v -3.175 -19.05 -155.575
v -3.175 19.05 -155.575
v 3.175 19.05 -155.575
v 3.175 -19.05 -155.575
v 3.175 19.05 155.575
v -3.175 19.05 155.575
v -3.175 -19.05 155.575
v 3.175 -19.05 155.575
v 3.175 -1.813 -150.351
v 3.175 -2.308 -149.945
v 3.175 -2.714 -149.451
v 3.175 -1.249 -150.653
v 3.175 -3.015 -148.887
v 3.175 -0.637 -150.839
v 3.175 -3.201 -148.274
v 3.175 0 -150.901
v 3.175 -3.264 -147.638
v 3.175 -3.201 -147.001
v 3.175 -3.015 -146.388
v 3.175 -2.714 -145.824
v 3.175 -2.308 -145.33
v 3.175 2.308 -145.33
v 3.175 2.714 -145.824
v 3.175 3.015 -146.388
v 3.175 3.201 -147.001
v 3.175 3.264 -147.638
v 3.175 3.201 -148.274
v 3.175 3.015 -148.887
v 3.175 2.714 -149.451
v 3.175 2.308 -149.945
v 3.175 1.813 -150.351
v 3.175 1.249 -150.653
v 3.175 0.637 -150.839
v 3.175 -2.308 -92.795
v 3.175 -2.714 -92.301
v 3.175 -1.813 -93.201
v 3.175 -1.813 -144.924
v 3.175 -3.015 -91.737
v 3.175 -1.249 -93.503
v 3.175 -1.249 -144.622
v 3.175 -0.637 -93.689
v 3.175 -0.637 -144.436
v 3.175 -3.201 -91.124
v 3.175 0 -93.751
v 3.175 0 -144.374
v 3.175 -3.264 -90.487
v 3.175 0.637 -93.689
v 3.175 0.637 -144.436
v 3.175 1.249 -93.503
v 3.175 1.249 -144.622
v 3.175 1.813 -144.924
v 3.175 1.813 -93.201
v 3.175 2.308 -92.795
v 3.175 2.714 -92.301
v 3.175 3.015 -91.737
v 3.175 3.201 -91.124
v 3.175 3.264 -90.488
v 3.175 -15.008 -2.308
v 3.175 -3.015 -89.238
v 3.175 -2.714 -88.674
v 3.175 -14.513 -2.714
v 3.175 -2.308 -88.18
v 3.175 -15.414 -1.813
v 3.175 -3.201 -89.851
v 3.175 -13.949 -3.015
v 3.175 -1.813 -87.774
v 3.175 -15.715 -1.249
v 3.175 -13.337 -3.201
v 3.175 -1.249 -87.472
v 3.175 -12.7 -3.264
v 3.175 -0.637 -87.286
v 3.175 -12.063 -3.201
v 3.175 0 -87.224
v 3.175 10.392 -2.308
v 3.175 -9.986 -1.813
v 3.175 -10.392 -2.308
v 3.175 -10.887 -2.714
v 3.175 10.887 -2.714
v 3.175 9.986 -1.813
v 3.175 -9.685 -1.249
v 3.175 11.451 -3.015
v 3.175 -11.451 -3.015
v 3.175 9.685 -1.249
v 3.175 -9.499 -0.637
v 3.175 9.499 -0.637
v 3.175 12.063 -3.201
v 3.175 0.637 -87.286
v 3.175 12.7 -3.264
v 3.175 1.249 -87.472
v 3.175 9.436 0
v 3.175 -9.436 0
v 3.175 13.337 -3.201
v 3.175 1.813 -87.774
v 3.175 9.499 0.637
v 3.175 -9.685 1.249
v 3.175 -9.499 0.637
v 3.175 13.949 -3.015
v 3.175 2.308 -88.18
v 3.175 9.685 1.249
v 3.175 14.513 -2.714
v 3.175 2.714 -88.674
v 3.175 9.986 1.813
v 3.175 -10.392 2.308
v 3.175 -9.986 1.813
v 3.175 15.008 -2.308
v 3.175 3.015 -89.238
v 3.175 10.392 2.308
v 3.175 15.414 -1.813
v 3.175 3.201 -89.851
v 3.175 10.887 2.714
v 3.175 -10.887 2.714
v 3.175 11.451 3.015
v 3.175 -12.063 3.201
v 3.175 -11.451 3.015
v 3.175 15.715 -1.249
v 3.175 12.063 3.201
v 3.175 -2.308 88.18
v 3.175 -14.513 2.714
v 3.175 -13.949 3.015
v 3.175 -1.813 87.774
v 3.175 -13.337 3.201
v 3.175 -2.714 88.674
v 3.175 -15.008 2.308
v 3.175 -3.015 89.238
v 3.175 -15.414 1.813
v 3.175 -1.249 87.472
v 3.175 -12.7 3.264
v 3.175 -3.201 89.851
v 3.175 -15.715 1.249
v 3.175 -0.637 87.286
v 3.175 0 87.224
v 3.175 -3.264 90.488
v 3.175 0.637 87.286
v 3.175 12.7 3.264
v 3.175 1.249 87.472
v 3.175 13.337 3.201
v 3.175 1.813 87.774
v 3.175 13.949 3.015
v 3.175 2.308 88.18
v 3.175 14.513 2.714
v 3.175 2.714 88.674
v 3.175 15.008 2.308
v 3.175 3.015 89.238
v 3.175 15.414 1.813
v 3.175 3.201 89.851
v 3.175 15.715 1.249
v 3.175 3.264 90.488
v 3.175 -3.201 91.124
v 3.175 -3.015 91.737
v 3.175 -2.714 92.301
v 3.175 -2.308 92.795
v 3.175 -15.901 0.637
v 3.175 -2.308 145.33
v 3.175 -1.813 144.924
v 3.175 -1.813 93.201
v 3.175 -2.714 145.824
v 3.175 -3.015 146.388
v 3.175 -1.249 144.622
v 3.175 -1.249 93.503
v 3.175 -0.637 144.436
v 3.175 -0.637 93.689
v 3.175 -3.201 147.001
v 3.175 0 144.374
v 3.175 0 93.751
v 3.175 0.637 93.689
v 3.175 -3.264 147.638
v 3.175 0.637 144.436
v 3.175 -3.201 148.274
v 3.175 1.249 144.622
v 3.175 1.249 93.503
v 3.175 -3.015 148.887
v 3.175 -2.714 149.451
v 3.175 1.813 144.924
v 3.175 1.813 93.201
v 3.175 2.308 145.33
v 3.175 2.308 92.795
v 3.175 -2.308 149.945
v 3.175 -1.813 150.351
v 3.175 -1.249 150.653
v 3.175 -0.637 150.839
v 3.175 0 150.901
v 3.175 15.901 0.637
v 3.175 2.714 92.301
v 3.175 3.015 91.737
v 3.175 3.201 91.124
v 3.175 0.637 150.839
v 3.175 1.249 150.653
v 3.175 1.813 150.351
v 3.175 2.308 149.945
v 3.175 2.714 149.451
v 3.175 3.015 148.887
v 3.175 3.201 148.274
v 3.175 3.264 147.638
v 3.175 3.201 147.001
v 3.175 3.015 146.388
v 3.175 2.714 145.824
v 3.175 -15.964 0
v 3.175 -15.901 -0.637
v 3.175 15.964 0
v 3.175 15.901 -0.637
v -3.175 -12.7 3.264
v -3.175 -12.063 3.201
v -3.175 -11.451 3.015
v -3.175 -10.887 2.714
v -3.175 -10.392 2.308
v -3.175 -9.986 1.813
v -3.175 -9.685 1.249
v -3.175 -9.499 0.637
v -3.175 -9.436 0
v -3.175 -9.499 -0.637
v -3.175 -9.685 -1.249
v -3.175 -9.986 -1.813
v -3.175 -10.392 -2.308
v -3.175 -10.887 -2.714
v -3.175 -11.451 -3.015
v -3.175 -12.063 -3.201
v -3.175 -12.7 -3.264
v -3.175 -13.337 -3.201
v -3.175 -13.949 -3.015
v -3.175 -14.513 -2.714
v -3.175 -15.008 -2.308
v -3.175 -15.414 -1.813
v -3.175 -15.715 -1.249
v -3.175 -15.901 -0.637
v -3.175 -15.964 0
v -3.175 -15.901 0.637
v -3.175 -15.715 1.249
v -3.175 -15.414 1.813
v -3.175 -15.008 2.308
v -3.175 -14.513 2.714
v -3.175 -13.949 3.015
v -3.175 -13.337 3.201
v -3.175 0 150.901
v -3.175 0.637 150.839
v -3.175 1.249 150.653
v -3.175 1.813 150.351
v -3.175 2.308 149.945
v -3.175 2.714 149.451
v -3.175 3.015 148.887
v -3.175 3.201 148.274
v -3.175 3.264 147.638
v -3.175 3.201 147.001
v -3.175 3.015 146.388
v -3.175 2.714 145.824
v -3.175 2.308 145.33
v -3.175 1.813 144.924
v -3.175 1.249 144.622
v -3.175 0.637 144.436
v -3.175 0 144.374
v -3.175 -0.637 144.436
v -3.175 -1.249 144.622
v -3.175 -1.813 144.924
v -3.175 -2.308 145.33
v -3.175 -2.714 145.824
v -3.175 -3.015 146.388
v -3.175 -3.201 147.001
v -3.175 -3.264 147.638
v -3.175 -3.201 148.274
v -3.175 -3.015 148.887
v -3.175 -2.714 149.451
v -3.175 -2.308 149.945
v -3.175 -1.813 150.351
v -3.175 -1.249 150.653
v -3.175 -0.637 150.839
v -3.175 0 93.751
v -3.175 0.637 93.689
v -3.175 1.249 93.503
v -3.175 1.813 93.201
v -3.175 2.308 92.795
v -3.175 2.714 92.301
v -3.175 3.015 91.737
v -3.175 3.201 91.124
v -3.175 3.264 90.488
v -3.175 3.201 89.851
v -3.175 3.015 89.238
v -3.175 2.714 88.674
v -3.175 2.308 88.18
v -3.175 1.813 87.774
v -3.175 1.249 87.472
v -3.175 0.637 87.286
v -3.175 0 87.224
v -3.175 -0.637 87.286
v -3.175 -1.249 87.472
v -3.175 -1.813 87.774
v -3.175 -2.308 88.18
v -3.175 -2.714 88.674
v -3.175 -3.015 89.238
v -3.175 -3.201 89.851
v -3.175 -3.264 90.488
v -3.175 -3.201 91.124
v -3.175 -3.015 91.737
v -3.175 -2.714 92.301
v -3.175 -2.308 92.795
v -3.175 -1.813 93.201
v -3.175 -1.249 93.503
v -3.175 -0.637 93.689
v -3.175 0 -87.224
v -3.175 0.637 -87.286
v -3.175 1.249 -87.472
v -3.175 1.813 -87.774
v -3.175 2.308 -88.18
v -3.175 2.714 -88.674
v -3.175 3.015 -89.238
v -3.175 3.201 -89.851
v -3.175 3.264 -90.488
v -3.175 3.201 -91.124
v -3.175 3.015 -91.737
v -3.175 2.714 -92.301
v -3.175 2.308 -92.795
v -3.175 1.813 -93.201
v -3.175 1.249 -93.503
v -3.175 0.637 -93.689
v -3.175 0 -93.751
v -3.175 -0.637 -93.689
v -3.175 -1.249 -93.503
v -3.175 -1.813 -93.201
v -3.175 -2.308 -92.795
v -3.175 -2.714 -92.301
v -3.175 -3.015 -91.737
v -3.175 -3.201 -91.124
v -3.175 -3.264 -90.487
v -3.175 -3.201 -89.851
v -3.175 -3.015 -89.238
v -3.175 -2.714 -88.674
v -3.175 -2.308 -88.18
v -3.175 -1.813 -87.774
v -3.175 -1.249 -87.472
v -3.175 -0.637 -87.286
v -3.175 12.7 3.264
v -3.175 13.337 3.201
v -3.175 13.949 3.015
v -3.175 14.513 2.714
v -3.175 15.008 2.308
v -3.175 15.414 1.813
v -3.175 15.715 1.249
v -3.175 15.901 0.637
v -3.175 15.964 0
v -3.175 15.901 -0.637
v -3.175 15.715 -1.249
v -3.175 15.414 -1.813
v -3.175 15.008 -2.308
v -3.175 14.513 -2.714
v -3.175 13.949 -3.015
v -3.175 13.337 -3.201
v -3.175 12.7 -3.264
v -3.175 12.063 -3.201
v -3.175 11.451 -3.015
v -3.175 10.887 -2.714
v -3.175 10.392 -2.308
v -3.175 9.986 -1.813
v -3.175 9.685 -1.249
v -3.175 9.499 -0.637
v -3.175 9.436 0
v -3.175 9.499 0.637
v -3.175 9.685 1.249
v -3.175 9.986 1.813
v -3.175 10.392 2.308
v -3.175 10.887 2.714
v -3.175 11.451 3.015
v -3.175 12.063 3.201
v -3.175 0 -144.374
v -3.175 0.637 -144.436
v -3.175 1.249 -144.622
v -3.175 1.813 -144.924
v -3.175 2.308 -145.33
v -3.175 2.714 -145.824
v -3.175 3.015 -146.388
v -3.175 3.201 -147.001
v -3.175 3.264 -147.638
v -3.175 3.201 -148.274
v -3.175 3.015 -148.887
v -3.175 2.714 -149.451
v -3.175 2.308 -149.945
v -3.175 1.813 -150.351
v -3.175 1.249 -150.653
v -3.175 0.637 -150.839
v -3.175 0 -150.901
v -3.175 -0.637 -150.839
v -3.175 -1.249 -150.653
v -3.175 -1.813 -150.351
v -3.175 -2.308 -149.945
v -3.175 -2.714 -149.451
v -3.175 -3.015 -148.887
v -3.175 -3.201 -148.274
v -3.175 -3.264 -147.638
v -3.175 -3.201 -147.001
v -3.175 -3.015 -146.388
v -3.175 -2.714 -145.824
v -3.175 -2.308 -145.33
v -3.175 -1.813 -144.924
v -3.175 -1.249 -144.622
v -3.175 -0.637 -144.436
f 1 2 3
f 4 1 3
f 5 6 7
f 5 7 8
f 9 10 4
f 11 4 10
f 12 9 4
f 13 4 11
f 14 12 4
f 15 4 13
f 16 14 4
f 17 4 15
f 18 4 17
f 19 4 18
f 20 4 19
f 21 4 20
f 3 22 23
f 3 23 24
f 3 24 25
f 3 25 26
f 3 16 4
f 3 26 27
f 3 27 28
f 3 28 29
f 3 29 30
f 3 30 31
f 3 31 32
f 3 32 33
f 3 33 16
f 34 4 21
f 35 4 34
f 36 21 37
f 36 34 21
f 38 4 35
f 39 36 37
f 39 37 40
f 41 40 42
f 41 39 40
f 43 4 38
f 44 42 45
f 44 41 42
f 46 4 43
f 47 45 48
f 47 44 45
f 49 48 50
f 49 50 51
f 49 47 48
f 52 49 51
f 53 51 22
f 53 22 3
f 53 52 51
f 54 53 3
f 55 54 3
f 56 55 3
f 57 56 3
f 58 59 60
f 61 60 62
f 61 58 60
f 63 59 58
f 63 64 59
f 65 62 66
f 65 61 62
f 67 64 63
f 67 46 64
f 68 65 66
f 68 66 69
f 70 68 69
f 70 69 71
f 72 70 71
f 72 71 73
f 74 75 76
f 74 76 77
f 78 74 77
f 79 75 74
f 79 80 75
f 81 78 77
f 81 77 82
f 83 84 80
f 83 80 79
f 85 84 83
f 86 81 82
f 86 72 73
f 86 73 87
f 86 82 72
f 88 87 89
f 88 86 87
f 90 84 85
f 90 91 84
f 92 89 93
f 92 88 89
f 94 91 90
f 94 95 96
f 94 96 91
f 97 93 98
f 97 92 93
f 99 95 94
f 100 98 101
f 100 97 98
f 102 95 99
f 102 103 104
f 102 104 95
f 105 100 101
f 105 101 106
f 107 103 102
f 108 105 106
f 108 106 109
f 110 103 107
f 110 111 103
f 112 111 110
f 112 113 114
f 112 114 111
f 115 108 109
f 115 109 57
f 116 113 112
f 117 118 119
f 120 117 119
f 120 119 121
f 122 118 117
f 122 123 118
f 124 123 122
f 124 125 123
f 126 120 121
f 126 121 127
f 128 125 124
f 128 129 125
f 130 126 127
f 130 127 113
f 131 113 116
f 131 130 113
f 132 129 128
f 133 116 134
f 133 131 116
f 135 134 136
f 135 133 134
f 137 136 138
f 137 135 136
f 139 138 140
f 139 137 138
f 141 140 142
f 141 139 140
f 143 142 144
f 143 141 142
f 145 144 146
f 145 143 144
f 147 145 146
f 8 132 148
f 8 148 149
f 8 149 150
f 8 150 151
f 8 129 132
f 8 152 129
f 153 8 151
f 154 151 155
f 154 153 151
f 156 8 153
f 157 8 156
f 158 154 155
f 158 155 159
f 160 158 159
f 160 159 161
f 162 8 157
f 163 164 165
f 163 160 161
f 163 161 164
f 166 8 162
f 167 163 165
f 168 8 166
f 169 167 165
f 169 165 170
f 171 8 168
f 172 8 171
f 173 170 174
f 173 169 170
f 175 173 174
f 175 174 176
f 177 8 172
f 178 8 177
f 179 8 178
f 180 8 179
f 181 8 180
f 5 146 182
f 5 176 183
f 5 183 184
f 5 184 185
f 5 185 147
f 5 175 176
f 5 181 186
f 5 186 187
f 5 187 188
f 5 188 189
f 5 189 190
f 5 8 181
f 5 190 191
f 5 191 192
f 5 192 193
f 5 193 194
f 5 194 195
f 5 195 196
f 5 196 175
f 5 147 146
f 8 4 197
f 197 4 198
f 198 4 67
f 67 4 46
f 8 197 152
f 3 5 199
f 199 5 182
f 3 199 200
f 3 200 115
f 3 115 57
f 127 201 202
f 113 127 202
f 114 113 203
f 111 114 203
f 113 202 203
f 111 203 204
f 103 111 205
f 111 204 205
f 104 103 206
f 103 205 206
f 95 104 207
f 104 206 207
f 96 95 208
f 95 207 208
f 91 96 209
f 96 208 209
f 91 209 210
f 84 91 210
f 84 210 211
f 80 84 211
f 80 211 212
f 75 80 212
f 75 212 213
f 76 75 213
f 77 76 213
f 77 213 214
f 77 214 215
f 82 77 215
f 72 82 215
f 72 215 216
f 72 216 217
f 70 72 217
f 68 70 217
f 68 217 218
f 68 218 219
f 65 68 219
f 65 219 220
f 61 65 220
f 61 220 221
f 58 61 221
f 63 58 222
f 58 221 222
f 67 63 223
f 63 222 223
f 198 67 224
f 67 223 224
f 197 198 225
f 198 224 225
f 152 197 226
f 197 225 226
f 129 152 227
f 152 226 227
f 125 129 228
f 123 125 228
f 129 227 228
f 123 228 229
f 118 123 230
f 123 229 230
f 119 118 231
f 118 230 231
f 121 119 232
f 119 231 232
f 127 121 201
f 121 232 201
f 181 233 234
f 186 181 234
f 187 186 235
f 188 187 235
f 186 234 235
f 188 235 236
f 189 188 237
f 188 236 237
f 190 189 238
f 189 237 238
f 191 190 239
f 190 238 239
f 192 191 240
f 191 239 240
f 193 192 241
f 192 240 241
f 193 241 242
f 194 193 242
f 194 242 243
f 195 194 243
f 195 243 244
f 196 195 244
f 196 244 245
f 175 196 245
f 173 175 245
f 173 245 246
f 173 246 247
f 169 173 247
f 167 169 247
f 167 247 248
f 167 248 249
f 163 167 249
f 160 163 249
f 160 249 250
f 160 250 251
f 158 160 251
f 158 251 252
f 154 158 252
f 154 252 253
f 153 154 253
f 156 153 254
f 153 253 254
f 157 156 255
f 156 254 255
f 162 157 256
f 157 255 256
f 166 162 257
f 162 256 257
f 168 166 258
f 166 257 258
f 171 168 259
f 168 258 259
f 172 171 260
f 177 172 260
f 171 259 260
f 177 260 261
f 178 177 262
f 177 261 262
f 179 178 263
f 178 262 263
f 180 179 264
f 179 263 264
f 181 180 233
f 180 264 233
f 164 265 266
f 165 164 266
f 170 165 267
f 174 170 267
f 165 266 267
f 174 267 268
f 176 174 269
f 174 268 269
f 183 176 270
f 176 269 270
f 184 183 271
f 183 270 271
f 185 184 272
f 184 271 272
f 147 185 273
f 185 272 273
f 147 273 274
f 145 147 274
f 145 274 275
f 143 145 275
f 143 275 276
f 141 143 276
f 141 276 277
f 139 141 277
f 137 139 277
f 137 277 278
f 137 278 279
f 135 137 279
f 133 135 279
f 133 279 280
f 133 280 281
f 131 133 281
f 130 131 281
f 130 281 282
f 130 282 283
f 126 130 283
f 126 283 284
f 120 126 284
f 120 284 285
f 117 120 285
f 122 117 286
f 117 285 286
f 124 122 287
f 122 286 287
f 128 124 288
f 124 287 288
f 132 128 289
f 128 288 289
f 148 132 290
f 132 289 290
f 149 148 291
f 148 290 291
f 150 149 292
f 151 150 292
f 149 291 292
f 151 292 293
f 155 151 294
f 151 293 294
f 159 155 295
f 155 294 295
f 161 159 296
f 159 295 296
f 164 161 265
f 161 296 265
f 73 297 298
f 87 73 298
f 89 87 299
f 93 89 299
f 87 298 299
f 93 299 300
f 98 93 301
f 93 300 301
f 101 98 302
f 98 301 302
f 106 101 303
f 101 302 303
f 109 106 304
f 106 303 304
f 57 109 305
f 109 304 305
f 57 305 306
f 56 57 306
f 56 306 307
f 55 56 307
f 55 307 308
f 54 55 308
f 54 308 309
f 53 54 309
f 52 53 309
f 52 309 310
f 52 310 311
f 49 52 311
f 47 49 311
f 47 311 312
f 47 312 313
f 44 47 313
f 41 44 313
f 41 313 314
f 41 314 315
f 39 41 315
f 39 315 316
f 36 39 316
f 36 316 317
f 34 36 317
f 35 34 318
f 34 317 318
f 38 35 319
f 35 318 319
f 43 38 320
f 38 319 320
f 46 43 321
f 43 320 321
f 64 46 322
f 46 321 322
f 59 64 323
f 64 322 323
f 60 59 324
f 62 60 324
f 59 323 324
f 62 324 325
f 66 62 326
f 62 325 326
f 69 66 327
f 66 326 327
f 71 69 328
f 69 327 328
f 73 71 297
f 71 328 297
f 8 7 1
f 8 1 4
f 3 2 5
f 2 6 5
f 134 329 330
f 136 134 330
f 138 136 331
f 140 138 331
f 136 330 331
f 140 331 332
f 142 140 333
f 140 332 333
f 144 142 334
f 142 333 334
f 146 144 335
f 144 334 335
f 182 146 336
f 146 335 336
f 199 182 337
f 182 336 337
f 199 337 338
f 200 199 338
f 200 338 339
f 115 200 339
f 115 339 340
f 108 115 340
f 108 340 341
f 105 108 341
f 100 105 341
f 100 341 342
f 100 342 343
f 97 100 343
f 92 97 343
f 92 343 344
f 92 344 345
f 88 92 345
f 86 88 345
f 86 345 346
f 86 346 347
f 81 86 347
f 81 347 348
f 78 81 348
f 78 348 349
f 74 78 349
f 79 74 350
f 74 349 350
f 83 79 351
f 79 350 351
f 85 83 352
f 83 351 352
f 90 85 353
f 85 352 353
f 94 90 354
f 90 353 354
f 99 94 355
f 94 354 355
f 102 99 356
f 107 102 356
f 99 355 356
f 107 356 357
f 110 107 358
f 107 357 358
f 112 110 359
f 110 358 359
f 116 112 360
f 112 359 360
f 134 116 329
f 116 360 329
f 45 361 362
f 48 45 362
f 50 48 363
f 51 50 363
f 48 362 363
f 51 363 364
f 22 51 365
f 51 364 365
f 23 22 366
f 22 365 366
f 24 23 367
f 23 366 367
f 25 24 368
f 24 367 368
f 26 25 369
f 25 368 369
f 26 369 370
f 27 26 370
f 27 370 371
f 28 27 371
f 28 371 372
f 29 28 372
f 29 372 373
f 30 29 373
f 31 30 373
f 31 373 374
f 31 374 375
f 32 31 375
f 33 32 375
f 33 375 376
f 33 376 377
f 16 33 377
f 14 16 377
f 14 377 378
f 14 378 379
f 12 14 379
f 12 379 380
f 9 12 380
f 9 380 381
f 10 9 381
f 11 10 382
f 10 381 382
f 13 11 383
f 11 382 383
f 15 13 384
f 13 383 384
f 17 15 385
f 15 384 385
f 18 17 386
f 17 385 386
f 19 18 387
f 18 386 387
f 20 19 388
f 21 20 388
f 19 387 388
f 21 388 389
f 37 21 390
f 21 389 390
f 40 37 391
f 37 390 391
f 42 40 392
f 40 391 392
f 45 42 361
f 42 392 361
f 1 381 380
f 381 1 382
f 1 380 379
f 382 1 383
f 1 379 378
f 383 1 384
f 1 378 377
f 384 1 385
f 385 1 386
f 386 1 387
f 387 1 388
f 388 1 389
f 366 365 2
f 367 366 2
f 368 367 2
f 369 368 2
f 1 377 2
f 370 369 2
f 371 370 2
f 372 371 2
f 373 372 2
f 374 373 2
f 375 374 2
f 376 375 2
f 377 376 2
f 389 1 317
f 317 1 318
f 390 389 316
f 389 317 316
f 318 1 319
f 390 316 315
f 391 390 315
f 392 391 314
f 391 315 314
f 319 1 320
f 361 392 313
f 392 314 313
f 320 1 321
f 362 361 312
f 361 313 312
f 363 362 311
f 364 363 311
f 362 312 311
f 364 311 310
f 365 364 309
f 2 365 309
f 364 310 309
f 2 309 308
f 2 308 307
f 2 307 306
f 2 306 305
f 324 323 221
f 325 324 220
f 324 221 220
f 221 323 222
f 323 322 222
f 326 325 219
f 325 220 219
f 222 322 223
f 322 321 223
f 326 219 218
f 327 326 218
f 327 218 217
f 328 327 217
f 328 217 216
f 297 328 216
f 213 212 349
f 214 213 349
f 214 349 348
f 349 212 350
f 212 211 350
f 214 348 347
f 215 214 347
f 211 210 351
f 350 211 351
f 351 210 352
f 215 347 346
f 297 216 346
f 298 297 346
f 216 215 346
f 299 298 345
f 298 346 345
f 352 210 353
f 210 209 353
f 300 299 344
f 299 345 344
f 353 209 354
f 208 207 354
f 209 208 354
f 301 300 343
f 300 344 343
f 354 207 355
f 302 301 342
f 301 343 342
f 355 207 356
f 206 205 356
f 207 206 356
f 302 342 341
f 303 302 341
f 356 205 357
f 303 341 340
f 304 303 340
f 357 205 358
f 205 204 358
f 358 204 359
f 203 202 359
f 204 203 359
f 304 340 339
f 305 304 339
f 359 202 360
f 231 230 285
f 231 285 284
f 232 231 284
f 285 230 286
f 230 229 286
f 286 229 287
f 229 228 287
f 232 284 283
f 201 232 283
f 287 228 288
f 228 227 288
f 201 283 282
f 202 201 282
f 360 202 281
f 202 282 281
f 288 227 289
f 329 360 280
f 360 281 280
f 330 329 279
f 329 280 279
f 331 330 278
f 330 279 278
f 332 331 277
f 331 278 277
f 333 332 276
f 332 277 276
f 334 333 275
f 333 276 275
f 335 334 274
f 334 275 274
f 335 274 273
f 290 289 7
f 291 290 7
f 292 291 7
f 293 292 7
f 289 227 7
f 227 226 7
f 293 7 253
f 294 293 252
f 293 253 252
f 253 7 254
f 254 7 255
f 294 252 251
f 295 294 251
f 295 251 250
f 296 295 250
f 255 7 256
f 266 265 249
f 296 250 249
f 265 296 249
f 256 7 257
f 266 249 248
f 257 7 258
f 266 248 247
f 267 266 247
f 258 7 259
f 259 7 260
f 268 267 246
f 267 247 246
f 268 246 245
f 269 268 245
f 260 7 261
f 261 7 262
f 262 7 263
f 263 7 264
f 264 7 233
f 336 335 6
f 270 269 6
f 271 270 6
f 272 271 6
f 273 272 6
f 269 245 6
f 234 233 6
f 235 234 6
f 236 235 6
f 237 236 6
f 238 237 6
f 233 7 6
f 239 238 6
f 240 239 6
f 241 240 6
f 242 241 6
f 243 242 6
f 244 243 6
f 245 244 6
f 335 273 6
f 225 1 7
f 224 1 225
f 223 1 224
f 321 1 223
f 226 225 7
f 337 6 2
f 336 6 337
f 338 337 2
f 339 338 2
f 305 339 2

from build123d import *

# Parameters (mm, degrees)
SKETCH1_W               = 6.35
SKETCH1_H               = 38.1
BOSS_EXTRUDE1_DEPTH     = 155.575
F_1_4_CLEARANCE_HOLE1_D = 6.5278


with BuildPart() as part:
    # Sketch1 → Boss-Extrude1 (new, symmetric)
    with BuildSketch(Plane.XY):
        Rectangle(SKETCH1_W, SKETCH1_H)
    extrude(amount=BOSS_EXTRUDE1_DEPTH, both=True)

    # 1/4 Clearance Hole1 (through all)
    with Locations(Plane(origin=(3.175, 0, 0), x_dir=(0, 0, -1), z_dir=(1, 0, 0))):
        with Locations((-147.6375, 0), (-90.4875, 0), (90.4875, 0), (147.6375, 0), (0, 12.7), (0, -12.7)):
            Hole(F_1_4_CLEARANCE_HOLE1_D / 2)


solid = part.part
